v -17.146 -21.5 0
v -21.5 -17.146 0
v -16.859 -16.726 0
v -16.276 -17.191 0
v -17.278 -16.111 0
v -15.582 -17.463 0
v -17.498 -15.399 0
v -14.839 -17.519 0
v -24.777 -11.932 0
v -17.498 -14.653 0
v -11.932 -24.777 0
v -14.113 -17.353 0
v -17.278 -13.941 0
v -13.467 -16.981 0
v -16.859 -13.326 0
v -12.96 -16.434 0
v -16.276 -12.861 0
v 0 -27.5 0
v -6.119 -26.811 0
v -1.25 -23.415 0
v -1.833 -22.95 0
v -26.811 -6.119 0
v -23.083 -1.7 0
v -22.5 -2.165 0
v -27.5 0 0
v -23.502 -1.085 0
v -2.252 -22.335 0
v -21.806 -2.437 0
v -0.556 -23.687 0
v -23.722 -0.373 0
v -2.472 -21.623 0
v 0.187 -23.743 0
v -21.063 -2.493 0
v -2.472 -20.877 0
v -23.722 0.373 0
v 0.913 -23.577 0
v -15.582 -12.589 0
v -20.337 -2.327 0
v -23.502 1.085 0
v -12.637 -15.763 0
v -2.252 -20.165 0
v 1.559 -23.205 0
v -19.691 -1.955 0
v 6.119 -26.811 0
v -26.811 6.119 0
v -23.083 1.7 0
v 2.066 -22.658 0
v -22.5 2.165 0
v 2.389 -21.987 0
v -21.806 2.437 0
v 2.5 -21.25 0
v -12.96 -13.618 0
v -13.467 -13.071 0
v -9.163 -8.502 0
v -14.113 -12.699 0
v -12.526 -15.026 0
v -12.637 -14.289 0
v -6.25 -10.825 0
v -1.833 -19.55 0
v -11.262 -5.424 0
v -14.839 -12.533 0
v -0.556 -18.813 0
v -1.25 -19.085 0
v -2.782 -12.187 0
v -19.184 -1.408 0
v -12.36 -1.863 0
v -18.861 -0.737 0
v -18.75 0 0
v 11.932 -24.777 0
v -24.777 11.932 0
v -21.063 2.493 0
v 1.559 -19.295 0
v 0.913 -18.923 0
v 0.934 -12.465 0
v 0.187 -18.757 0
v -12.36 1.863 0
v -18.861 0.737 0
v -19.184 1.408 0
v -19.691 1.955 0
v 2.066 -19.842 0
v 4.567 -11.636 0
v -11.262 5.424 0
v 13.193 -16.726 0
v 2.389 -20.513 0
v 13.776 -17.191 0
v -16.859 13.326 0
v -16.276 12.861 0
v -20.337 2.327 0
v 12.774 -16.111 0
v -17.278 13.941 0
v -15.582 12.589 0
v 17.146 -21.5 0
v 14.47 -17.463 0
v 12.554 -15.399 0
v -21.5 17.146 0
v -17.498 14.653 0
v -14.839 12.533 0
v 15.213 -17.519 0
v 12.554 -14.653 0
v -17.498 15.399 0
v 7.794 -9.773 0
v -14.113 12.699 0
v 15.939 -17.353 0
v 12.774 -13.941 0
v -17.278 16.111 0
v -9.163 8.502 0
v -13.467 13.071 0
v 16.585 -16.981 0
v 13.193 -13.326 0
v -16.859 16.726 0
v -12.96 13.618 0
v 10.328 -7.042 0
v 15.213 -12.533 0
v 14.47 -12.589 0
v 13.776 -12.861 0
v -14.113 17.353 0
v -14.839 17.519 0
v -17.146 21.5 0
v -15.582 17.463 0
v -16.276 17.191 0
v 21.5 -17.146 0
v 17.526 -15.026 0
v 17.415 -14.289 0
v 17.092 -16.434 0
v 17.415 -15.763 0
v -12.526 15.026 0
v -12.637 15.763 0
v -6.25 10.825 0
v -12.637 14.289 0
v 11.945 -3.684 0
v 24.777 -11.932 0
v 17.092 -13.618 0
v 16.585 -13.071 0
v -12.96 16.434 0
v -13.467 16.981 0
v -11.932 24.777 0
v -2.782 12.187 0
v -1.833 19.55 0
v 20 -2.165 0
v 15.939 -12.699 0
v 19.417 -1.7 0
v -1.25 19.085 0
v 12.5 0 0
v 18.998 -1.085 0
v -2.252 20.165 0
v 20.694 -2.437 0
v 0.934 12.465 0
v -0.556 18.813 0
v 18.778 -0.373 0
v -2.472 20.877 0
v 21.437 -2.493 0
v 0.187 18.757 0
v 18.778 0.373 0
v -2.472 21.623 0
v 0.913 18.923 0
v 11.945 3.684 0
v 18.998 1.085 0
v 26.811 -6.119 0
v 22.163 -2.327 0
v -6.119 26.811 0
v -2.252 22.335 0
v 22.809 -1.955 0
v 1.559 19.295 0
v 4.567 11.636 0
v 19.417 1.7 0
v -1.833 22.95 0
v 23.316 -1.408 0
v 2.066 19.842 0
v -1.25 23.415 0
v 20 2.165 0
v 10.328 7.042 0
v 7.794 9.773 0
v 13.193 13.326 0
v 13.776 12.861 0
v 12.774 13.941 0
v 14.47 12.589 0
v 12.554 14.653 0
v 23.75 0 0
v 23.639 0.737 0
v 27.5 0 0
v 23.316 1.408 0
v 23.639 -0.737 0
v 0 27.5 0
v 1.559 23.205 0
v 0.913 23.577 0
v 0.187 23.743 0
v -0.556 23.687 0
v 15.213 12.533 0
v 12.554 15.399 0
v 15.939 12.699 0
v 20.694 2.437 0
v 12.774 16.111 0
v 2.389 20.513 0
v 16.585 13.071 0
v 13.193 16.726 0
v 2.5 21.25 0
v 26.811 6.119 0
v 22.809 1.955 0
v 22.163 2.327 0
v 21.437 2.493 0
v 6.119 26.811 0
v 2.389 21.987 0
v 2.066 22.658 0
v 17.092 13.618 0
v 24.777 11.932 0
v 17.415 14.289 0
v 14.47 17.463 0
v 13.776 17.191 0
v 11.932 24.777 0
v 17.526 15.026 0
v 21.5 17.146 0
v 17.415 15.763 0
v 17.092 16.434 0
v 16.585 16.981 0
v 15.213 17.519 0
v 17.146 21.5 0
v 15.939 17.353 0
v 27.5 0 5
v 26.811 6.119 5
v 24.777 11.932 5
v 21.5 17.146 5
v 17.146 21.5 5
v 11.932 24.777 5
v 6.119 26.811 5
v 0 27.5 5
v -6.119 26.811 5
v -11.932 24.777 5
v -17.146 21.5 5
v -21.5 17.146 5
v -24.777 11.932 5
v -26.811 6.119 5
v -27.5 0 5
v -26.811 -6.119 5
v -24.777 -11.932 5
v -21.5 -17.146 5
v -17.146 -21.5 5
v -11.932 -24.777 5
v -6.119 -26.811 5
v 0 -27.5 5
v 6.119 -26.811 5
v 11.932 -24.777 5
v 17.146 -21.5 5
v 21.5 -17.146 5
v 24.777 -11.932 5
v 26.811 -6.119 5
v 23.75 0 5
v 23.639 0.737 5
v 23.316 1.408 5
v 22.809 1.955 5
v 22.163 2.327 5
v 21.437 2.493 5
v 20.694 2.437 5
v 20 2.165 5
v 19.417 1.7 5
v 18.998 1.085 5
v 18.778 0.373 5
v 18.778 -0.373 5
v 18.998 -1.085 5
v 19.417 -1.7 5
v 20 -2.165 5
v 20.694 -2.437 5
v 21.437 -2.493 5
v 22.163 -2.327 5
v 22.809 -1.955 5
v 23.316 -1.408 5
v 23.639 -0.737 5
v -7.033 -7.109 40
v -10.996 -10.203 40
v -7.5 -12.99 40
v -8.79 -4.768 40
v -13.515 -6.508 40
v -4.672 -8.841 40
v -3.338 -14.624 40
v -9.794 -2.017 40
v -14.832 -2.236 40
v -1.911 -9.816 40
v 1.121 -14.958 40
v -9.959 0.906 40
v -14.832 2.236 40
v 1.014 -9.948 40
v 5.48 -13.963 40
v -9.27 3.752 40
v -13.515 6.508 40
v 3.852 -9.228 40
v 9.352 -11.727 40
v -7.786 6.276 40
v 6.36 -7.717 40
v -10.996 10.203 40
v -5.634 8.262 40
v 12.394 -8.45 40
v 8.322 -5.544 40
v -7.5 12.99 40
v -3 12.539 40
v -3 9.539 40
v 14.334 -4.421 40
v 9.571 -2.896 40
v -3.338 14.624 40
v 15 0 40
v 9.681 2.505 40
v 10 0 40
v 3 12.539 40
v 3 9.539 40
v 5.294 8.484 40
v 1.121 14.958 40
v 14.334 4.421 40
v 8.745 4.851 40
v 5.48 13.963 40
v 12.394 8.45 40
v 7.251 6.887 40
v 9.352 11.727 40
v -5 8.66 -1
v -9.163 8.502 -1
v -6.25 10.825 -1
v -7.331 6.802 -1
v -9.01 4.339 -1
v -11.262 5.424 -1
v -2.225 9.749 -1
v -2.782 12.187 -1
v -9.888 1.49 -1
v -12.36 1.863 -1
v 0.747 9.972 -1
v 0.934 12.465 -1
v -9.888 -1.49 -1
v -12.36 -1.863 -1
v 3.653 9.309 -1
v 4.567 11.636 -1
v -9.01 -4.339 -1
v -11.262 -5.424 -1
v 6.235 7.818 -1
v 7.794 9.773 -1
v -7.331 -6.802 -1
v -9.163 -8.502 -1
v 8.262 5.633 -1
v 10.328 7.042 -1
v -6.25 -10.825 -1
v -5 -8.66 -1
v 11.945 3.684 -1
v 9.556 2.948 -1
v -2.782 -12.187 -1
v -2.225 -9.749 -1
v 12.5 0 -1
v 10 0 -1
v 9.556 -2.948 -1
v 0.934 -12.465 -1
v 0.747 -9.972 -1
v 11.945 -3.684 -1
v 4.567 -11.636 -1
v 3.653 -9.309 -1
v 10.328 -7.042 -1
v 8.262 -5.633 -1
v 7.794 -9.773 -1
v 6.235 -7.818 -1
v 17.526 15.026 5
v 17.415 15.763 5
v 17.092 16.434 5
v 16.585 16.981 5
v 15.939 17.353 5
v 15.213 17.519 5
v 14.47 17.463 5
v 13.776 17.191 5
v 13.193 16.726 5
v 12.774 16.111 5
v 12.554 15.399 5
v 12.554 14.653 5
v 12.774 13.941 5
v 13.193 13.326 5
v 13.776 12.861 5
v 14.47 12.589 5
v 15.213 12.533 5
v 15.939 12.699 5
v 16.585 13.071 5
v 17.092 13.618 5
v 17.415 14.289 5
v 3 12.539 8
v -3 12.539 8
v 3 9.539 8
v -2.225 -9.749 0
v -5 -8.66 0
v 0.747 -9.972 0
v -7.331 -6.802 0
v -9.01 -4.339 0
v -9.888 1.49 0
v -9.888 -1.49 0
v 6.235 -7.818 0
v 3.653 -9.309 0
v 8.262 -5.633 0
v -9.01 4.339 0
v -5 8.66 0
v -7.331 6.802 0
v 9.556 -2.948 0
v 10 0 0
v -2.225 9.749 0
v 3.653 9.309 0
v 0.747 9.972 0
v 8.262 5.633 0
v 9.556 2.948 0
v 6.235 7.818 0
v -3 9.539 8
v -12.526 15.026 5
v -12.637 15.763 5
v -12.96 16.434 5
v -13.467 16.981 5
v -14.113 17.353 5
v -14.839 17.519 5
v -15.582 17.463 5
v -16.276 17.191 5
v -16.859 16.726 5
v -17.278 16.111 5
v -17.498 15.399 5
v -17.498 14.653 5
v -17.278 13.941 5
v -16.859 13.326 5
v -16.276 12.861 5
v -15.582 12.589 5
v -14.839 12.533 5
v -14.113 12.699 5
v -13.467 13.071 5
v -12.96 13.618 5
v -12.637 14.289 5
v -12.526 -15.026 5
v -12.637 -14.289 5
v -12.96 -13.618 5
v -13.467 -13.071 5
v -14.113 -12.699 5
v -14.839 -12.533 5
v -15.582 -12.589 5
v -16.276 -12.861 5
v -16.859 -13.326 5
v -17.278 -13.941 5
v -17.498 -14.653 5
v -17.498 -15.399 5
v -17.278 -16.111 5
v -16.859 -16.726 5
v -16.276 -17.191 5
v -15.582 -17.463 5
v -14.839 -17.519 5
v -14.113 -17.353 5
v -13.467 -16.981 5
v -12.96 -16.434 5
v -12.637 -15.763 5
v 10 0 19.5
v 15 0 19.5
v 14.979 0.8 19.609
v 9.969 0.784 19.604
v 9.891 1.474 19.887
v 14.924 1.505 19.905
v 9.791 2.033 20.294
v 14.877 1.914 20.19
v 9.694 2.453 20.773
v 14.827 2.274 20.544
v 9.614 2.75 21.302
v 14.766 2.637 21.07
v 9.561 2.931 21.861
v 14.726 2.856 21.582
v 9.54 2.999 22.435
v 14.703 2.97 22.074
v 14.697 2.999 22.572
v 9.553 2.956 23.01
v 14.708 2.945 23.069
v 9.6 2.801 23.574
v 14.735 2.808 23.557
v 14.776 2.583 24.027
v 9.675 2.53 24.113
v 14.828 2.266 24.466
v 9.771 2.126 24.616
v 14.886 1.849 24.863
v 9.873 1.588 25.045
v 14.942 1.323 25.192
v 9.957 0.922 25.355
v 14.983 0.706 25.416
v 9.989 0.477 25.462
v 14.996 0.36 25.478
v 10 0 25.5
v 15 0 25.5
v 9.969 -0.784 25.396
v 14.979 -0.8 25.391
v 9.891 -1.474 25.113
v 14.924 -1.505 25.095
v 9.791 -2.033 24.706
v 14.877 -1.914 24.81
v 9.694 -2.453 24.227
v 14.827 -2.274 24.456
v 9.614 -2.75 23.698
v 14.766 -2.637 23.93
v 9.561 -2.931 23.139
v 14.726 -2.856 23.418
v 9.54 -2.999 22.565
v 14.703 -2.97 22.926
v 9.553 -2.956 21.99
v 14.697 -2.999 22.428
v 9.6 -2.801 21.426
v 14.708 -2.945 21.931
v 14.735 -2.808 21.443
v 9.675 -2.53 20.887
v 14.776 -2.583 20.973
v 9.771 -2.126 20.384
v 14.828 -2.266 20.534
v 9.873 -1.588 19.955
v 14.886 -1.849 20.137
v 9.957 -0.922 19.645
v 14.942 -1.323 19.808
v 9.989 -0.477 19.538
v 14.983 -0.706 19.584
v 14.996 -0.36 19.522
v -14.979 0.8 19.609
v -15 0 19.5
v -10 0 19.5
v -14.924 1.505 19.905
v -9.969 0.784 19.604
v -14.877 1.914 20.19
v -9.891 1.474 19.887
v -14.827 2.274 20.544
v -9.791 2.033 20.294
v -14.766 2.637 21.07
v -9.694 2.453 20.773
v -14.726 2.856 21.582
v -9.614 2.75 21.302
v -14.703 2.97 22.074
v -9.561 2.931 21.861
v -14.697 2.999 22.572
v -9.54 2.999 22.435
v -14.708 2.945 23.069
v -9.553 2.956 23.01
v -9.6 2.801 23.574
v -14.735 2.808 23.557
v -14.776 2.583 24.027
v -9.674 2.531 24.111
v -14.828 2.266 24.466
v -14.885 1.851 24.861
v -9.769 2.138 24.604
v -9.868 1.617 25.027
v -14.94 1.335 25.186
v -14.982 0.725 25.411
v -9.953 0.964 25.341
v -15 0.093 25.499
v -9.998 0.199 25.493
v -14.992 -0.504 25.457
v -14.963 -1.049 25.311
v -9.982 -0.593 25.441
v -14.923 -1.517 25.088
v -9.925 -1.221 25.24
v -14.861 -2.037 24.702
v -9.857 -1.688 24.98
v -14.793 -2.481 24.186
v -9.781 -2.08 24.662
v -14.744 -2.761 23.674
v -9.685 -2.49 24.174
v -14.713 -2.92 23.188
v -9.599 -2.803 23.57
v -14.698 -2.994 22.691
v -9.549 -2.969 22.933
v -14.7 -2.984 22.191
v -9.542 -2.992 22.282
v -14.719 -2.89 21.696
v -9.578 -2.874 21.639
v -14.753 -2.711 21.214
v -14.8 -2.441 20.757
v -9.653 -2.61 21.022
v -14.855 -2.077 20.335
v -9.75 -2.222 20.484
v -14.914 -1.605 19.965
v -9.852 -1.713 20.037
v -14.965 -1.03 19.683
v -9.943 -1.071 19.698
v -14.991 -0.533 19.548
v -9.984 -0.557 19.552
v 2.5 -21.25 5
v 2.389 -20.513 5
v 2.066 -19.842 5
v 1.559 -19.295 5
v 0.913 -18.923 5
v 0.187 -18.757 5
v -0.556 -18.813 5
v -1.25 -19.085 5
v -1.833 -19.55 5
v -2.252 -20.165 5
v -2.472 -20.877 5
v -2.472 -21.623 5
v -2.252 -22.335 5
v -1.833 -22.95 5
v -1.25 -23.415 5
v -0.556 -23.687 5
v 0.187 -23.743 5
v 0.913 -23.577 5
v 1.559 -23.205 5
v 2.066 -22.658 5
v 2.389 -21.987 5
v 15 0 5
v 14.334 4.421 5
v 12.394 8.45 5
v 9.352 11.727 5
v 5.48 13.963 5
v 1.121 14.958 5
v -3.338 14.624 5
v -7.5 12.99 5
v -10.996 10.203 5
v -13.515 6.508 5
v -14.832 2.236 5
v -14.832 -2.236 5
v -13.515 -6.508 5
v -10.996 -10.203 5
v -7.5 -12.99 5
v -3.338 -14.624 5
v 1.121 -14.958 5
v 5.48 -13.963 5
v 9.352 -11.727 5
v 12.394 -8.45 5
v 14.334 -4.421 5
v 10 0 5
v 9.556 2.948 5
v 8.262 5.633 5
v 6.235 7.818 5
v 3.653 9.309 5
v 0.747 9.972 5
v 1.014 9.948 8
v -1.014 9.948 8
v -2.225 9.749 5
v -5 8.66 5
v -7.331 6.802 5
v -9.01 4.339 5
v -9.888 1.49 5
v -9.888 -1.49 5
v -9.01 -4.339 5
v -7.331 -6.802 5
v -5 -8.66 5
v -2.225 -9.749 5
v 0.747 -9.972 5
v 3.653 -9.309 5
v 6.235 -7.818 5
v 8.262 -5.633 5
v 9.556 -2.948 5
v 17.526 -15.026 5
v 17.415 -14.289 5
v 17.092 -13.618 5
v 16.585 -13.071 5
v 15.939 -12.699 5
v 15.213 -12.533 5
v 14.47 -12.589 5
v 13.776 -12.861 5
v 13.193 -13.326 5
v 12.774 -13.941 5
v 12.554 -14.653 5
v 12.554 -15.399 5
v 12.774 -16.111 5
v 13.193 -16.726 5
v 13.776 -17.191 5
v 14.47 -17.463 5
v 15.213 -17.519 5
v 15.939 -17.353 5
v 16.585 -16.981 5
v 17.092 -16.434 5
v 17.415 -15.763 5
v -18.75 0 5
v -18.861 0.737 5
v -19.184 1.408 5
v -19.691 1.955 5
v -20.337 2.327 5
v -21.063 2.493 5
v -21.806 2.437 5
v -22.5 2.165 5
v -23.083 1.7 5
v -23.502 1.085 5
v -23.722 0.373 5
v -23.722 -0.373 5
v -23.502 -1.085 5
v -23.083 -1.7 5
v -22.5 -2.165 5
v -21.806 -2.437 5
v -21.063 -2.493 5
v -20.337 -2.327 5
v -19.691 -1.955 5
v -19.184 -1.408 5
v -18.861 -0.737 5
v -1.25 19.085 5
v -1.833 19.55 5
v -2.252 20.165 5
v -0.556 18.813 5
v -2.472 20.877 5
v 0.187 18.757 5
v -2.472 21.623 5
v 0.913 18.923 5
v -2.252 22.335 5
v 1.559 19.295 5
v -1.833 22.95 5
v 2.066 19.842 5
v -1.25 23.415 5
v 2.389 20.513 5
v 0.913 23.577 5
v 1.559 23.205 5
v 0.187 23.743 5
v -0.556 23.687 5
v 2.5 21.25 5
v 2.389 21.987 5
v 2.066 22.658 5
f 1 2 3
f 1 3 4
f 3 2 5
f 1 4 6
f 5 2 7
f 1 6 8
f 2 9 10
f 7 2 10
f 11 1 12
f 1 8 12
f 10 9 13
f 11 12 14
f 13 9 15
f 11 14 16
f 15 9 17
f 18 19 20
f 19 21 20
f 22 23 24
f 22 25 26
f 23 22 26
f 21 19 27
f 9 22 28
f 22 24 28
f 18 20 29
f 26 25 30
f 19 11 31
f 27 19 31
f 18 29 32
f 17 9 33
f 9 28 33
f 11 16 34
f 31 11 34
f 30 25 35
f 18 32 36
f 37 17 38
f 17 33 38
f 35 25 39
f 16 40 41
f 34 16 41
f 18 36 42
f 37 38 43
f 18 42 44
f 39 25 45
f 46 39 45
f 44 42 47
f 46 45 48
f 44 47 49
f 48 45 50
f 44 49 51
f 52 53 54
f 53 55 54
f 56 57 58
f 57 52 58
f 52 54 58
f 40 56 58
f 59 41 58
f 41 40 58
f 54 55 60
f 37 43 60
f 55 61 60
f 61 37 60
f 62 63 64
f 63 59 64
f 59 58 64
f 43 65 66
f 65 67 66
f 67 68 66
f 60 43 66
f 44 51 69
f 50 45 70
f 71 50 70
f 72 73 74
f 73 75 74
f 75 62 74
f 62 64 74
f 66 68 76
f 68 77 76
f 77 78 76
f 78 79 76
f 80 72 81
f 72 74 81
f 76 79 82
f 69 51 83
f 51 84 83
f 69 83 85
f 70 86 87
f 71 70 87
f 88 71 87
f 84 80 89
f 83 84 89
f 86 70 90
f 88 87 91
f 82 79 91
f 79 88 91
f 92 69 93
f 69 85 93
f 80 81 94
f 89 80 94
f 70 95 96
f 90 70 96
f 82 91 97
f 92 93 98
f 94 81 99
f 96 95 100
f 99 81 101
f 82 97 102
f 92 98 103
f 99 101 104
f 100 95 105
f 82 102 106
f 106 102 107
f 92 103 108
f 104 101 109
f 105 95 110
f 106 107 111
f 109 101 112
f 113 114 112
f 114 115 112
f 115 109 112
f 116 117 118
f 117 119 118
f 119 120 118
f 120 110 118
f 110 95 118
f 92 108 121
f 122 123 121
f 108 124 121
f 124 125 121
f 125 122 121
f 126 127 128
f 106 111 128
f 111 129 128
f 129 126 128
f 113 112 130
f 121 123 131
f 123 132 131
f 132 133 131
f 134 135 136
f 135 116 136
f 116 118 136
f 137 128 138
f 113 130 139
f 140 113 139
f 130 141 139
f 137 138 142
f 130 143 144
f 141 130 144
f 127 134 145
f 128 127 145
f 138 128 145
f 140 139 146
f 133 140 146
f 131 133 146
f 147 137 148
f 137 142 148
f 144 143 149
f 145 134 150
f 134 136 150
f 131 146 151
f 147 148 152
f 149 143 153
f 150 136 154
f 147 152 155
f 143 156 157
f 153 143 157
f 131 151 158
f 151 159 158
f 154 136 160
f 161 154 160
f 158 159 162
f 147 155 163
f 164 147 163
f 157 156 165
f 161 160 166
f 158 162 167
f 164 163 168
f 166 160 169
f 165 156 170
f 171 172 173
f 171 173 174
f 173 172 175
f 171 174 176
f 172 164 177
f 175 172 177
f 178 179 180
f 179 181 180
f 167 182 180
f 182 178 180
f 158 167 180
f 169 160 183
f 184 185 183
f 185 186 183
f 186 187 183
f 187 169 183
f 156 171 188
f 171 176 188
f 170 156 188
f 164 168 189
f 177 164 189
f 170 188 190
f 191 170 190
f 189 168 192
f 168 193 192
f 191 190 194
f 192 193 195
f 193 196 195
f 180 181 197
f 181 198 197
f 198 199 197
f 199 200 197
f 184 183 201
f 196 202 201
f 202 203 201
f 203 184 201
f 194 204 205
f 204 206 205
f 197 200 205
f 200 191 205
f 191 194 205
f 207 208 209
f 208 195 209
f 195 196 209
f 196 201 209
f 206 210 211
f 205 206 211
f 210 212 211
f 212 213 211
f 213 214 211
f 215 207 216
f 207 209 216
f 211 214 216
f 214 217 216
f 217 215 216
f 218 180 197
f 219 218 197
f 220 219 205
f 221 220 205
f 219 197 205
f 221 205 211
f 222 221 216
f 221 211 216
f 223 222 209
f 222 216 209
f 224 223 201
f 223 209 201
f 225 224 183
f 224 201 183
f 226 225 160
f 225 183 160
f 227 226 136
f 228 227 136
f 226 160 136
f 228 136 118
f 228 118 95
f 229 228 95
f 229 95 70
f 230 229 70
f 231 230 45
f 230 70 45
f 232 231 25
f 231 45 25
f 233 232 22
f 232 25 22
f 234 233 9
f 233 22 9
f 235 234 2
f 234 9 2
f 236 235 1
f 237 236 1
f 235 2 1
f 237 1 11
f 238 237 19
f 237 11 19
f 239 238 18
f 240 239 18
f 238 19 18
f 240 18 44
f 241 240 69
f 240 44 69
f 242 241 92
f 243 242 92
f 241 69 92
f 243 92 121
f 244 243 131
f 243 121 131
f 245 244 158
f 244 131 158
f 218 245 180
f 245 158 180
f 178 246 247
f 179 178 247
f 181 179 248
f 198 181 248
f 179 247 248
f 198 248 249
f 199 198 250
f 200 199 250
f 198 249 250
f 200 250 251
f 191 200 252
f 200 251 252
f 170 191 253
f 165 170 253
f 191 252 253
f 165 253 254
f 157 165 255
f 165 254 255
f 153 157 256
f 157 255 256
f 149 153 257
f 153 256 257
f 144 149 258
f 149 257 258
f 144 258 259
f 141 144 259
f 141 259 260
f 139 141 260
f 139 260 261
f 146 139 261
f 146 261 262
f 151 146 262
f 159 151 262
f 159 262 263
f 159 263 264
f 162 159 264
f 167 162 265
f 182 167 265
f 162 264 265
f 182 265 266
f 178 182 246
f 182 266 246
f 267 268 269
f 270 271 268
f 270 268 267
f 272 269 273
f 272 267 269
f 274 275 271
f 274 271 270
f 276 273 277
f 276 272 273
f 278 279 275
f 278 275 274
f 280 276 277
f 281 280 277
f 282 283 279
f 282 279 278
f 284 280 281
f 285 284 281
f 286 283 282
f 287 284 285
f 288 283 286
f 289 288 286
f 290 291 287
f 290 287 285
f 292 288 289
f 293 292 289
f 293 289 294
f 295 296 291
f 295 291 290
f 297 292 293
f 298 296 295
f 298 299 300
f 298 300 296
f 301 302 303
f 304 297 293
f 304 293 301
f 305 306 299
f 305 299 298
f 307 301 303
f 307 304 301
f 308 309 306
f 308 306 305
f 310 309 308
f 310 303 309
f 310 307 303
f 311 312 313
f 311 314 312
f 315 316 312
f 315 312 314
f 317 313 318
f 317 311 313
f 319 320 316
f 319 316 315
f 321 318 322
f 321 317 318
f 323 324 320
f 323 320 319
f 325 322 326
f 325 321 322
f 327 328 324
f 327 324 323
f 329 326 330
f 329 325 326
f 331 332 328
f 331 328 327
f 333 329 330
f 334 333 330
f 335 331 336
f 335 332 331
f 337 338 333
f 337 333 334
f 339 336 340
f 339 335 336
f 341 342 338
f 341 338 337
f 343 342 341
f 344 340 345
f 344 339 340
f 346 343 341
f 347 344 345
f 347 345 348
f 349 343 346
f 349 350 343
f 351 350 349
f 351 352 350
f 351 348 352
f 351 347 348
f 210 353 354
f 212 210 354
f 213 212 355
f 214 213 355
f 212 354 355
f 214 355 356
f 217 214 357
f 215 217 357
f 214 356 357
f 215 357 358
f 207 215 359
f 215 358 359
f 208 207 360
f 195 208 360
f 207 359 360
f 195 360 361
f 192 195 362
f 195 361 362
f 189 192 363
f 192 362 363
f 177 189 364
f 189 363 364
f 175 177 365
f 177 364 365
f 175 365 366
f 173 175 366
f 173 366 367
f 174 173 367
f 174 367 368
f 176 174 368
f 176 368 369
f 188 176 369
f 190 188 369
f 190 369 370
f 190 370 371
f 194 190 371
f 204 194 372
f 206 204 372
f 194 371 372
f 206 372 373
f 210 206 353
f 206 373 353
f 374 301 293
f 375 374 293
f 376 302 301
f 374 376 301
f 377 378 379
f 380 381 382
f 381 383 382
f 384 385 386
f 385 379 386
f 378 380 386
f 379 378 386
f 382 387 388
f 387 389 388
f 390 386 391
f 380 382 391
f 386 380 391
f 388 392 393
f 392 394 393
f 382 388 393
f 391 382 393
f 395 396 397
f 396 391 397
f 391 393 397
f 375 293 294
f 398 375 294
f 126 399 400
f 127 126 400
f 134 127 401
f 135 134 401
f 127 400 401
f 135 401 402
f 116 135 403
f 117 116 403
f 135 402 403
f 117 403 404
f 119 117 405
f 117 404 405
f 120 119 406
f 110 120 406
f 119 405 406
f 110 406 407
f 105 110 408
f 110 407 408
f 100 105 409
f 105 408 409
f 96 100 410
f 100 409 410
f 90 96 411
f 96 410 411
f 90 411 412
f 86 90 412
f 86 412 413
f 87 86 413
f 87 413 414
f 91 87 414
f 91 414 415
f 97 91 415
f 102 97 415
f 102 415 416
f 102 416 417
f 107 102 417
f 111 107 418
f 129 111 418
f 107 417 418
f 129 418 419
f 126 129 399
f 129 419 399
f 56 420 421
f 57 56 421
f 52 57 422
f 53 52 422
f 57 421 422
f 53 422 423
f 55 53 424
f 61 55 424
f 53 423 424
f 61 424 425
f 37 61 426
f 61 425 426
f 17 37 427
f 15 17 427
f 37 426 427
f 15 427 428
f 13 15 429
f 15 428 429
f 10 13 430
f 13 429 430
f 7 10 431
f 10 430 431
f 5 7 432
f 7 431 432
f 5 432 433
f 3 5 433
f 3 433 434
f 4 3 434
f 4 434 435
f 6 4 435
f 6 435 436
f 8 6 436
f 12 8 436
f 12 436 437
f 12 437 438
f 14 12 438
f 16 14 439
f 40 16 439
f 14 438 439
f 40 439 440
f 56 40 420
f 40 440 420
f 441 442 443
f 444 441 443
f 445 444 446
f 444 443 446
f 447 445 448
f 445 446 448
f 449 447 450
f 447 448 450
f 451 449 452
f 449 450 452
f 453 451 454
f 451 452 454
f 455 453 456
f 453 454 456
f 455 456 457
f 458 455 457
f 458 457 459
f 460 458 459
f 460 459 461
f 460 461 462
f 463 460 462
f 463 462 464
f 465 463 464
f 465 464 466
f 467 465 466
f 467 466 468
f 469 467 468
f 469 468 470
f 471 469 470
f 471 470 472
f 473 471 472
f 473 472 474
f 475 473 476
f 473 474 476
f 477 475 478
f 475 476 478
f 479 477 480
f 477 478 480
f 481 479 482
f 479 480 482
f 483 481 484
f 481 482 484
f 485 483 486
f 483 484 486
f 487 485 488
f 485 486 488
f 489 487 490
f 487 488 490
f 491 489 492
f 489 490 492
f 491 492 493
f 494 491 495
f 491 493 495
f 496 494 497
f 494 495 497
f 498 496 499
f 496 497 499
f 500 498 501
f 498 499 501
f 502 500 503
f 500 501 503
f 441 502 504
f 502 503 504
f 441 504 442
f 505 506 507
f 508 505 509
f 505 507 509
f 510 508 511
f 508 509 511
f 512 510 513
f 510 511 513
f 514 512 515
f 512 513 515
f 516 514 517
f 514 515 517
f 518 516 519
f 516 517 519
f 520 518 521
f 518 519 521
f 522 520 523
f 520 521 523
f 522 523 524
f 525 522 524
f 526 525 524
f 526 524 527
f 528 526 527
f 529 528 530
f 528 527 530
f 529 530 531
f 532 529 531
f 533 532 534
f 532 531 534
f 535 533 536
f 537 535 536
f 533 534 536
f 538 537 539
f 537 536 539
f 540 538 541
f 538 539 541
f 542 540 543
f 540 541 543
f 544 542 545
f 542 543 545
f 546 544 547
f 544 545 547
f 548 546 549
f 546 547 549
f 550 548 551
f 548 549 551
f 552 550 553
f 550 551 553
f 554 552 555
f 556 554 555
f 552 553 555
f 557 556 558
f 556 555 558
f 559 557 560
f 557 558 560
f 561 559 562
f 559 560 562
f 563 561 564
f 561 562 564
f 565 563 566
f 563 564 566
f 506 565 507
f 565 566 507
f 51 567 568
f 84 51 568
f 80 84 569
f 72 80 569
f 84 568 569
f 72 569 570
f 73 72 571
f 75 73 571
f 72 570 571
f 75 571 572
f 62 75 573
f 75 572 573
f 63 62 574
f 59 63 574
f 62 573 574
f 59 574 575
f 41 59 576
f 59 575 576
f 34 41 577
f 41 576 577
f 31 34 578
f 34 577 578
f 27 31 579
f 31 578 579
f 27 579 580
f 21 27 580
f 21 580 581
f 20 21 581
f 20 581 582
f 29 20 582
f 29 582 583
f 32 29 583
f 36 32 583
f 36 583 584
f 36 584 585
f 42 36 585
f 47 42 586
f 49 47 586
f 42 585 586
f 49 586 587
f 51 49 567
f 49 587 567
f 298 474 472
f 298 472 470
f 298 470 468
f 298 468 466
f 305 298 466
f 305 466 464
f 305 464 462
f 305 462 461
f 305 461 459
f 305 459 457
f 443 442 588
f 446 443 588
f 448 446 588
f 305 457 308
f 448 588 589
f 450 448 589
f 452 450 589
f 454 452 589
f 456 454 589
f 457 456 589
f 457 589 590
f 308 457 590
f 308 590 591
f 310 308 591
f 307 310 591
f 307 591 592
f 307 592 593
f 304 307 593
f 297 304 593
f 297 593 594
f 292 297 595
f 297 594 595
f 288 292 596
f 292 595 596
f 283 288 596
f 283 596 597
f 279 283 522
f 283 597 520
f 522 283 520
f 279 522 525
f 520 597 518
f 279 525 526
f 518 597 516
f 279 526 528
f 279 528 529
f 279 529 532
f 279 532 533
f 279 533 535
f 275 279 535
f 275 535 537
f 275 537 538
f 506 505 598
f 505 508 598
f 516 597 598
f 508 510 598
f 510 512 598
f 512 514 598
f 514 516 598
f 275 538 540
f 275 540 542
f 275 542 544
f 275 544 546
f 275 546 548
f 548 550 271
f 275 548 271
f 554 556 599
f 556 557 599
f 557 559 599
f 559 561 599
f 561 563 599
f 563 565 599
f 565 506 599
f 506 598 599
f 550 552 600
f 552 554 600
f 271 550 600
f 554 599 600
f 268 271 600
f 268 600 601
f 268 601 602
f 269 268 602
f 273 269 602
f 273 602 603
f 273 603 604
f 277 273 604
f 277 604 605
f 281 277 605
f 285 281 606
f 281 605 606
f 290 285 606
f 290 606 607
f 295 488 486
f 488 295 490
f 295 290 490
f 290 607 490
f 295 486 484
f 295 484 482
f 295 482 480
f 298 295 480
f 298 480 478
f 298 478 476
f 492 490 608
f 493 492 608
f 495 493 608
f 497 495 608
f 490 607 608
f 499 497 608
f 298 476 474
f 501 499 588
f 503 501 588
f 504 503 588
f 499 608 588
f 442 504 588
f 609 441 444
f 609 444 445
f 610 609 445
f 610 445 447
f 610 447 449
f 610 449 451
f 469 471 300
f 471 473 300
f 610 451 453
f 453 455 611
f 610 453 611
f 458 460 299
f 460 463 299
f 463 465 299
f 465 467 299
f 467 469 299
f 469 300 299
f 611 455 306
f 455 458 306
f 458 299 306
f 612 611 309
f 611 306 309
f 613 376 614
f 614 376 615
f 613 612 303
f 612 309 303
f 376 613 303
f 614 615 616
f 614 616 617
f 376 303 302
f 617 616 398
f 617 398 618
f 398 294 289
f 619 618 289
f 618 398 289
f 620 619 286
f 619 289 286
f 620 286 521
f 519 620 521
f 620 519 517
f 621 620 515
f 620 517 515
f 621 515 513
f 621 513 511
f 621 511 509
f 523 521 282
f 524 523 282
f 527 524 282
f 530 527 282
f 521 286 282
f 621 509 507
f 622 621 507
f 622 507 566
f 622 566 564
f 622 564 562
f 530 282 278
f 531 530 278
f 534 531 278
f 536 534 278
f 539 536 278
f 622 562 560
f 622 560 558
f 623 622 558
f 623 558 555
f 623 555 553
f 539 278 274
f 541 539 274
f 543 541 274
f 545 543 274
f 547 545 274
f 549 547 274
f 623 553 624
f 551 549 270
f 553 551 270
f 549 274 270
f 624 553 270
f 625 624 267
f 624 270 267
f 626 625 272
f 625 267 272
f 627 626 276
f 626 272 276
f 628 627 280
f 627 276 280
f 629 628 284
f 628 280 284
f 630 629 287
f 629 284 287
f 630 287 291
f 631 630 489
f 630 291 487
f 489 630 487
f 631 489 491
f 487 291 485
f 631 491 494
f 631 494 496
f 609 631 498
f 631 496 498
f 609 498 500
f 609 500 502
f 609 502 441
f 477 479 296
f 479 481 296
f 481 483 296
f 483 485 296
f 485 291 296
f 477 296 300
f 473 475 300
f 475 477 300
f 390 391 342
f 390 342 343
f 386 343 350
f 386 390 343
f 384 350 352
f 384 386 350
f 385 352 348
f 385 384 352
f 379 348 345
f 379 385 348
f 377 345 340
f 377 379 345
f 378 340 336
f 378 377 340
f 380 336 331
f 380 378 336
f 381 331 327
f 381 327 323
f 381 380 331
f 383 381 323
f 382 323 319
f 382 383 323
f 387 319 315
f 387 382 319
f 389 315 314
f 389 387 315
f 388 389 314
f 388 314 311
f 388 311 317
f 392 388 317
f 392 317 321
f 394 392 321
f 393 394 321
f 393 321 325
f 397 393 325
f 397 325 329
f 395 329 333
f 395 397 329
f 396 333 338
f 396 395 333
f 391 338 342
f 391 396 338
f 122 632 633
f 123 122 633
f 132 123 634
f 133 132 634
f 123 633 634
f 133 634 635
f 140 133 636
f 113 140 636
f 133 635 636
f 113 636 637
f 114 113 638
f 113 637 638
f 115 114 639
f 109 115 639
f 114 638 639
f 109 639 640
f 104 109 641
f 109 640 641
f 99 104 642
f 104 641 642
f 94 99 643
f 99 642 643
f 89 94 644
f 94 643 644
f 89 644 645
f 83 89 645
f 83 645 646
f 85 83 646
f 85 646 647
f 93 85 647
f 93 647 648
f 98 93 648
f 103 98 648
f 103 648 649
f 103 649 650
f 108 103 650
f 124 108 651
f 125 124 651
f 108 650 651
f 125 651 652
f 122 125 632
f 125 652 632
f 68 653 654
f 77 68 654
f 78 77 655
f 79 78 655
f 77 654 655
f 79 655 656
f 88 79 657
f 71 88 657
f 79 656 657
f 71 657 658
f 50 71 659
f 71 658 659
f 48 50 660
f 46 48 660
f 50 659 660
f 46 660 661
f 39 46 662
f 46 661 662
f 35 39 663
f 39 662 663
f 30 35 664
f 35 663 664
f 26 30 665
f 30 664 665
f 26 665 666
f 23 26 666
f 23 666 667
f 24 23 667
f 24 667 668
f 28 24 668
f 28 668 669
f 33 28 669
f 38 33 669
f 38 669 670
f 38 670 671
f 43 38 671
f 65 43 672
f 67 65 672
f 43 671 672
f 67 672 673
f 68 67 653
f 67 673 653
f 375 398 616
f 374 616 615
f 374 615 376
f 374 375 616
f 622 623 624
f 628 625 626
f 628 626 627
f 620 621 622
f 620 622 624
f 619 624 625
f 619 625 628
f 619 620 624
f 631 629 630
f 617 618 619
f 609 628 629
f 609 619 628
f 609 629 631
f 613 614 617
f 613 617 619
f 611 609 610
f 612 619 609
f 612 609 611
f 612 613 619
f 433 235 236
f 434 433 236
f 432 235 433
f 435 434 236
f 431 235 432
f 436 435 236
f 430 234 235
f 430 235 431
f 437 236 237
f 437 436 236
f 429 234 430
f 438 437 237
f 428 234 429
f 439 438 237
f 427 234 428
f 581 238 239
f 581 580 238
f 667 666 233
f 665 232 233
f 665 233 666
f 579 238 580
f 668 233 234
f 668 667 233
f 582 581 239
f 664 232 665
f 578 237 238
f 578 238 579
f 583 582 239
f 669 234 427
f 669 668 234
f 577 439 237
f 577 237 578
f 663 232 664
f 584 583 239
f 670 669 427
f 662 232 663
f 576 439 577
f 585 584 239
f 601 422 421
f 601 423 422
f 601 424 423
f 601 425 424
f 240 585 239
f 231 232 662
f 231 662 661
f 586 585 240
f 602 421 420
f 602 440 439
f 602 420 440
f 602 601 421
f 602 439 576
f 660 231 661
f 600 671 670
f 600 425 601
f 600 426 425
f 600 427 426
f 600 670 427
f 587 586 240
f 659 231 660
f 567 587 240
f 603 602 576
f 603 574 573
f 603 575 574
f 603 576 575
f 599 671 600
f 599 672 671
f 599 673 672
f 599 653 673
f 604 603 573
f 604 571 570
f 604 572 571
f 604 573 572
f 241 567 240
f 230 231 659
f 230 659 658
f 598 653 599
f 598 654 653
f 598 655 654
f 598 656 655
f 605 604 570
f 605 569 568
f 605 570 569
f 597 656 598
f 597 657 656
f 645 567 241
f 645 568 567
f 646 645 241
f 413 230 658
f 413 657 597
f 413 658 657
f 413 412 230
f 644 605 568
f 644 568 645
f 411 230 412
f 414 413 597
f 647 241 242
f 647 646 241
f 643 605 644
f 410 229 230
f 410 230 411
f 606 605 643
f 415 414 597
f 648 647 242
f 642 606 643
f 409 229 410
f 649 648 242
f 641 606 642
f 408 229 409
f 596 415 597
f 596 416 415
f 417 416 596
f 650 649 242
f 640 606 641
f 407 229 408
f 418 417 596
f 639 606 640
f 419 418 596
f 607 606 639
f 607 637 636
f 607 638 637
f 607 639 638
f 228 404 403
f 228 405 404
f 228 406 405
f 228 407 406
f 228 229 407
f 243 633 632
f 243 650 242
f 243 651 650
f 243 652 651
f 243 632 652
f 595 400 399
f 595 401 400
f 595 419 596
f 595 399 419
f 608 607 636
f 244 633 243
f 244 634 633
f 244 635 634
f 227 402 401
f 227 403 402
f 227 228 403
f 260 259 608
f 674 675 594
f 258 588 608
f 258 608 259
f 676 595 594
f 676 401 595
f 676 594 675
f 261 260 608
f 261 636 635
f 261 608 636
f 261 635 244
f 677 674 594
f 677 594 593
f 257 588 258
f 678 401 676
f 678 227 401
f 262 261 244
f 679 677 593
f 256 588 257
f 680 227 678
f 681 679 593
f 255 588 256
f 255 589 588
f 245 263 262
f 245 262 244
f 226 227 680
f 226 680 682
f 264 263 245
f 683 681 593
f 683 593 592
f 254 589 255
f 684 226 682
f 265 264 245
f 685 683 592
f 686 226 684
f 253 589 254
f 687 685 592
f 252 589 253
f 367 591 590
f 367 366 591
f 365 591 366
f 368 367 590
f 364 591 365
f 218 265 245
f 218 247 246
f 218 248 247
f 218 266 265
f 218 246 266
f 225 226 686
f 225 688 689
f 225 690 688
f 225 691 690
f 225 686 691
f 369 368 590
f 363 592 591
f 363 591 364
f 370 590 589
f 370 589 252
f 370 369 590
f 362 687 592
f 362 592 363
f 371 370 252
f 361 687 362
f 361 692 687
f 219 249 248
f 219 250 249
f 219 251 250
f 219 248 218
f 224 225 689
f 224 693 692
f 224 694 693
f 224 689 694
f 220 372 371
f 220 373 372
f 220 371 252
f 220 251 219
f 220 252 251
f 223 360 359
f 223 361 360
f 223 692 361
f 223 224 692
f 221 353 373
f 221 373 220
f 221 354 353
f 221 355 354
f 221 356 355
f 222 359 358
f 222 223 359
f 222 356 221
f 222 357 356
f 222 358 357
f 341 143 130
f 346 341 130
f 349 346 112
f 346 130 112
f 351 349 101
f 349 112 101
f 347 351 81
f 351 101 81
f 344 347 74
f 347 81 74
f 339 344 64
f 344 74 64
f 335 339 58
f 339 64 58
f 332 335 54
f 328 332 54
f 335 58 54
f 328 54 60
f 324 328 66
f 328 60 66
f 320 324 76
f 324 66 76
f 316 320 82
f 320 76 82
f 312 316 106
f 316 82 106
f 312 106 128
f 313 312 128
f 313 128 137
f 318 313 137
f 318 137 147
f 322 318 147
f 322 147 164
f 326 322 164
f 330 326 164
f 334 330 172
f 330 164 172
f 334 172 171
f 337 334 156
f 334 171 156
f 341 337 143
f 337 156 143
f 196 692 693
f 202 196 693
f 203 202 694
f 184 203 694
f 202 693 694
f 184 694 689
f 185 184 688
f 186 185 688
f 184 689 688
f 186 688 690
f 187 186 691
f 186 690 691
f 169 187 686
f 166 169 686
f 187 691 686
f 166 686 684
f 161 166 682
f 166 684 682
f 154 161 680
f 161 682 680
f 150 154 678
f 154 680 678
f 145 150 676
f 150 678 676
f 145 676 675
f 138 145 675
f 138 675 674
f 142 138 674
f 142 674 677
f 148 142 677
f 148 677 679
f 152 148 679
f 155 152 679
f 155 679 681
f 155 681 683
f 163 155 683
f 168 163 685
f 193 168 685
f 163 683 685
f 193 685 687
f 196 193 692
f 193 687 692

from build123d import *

# Parameters (mm, degrees)
CROQUIS1_R              = 27.5
SALIENTE_EXTRUIR1_DEPTH = 5
CROQUIS2_R              = 15
SALIENTE_EXTRUIR2_DEPTH = 35
CROQUIS5_R              = 2.5
CORTAR_EXTRUIR4_DEPTH   = 5
CROQUIS3_R              = 10
CORTAR_EXTRUIR5_DEPTH   = 35
CORTAR_EXTRUIR6_DEPTH   = 32
CROQUIS8_R              = 12.5
CROQUIS8_R_2            = 10
SALIENTE_EXTRUIR4_DEPTH = 1
CROQUIS9_R              = 3
CORTAR_EXTRUIR7_DEPTH   = 25


with BuildPart() as part:
    # Croquis1 → Saliente-Extruir1 (new body)
    with BuildSketch(Plane.XY):
        Circle(CROQUIS1_R)
    extrude(amount=SALIENTE_EXTRUIR1_DEPTH)

    # Croquis2 → Saliente-Extruir2 (add)
    with BuildSketch(Plane.XY.offset(5)):
        Circle(CROQUIS2_R)
    extrude(amount=SALIENTE_EXTRUIR2_DEPTH)

    # Croquis5 → Cortar-Extruir4 (cut)
    with BuildSketch(Plane.XY.offset(5)):
        with Locations((0, 21.25)):
            Circle(CROQUIS5_R)
        with Locations((0, -21.25)):
            Circle(CROQUIS5_R)
        with Locations((21.25, 0)):
            Circle(CROQUIS5_R)
        with Locations((-21.25, 0)):
            Circle(CROQUIS5_R)
        with Locations((15.0260191, 15.0260191)):
            Circle(CROQUIS5_R)
        with Locations((-15.0260191, 15.0260191)):
            Circle(CROQUIS5_R)
        with Locations((-15.0260191, -15.0260191)):
            Circle(CROQUIS5_R)
        with Locations((15.0260191, -15.0260191)):
            Circle(CROQUIS5_R)
    extrude(amount=-CORTAR_EXTRUIR4_DEPTH, mode=Mode.SUBTRACT)

    # Croquis3 → Cortar-Extruir5 (cut)
    with BuildSketch(Plane.XY.offset(40)):
        Circle(CROQUIS3_R)
    extrude(amount=-CORTAR_EXTRUIR5_DEPTH, mode=Mode.SUBTRACT)

    # Croquis7 → Cortar-Extruir6 (cut)
    with BuildSketch(Plane.XY.offset(40)):
        with BuildLine():
            Line((-3, 12.539392014), (-3, 9.539392014))
            ThreePointArc((-3, 9.539392014), (0, 10), (3, 9.539392014))
            Line((3, 9.539392014), (3, 12.539392014))
            Line((3, 12.539392014), (0, 12.539392014))
            Line((0, 12.539392014), (-3, 12.539392014))
        make_face()
    extrude(amount=-CORTAR_EXTRUIR6_DEPTH, mode=Mode.SUBTRACT)

    # Croquis8 → Saliente-Extruir4 (add)
    with BuildSketch(Plane(origin=(0, 0, 0), x_dir=(-1, 0, 0), z_dir=(0, 0, -1))):
        with Locations(Location((0, 0, 0), (0, 0, 180))):
            Circle(CROQUIS8_R)
        with Locations(Location((0, 0, 0), (0, 0, 180))):
            Circle(CROQUIS8_R_2, mode=Mode.SUBTRACT)
    extrude(amount=SALIENTE_EXTRUIR4_DEPTH)

    # Croquis9 → Cortar-Extruir7 (cut, symmetric)
    with BuildSketch(Plane(origin=(0, 0, 0), x_dir=(0, 0, -1), z_dir=(1, 0, 0))):
        with Locations((-22.5, 0)):
            Circle(CROQUIS9_R)
    extrude(amount=CORTAR_EXTRUIR7_DEPTH, both=True, mode=Mode.SUBTRACT)


solid = part.part
